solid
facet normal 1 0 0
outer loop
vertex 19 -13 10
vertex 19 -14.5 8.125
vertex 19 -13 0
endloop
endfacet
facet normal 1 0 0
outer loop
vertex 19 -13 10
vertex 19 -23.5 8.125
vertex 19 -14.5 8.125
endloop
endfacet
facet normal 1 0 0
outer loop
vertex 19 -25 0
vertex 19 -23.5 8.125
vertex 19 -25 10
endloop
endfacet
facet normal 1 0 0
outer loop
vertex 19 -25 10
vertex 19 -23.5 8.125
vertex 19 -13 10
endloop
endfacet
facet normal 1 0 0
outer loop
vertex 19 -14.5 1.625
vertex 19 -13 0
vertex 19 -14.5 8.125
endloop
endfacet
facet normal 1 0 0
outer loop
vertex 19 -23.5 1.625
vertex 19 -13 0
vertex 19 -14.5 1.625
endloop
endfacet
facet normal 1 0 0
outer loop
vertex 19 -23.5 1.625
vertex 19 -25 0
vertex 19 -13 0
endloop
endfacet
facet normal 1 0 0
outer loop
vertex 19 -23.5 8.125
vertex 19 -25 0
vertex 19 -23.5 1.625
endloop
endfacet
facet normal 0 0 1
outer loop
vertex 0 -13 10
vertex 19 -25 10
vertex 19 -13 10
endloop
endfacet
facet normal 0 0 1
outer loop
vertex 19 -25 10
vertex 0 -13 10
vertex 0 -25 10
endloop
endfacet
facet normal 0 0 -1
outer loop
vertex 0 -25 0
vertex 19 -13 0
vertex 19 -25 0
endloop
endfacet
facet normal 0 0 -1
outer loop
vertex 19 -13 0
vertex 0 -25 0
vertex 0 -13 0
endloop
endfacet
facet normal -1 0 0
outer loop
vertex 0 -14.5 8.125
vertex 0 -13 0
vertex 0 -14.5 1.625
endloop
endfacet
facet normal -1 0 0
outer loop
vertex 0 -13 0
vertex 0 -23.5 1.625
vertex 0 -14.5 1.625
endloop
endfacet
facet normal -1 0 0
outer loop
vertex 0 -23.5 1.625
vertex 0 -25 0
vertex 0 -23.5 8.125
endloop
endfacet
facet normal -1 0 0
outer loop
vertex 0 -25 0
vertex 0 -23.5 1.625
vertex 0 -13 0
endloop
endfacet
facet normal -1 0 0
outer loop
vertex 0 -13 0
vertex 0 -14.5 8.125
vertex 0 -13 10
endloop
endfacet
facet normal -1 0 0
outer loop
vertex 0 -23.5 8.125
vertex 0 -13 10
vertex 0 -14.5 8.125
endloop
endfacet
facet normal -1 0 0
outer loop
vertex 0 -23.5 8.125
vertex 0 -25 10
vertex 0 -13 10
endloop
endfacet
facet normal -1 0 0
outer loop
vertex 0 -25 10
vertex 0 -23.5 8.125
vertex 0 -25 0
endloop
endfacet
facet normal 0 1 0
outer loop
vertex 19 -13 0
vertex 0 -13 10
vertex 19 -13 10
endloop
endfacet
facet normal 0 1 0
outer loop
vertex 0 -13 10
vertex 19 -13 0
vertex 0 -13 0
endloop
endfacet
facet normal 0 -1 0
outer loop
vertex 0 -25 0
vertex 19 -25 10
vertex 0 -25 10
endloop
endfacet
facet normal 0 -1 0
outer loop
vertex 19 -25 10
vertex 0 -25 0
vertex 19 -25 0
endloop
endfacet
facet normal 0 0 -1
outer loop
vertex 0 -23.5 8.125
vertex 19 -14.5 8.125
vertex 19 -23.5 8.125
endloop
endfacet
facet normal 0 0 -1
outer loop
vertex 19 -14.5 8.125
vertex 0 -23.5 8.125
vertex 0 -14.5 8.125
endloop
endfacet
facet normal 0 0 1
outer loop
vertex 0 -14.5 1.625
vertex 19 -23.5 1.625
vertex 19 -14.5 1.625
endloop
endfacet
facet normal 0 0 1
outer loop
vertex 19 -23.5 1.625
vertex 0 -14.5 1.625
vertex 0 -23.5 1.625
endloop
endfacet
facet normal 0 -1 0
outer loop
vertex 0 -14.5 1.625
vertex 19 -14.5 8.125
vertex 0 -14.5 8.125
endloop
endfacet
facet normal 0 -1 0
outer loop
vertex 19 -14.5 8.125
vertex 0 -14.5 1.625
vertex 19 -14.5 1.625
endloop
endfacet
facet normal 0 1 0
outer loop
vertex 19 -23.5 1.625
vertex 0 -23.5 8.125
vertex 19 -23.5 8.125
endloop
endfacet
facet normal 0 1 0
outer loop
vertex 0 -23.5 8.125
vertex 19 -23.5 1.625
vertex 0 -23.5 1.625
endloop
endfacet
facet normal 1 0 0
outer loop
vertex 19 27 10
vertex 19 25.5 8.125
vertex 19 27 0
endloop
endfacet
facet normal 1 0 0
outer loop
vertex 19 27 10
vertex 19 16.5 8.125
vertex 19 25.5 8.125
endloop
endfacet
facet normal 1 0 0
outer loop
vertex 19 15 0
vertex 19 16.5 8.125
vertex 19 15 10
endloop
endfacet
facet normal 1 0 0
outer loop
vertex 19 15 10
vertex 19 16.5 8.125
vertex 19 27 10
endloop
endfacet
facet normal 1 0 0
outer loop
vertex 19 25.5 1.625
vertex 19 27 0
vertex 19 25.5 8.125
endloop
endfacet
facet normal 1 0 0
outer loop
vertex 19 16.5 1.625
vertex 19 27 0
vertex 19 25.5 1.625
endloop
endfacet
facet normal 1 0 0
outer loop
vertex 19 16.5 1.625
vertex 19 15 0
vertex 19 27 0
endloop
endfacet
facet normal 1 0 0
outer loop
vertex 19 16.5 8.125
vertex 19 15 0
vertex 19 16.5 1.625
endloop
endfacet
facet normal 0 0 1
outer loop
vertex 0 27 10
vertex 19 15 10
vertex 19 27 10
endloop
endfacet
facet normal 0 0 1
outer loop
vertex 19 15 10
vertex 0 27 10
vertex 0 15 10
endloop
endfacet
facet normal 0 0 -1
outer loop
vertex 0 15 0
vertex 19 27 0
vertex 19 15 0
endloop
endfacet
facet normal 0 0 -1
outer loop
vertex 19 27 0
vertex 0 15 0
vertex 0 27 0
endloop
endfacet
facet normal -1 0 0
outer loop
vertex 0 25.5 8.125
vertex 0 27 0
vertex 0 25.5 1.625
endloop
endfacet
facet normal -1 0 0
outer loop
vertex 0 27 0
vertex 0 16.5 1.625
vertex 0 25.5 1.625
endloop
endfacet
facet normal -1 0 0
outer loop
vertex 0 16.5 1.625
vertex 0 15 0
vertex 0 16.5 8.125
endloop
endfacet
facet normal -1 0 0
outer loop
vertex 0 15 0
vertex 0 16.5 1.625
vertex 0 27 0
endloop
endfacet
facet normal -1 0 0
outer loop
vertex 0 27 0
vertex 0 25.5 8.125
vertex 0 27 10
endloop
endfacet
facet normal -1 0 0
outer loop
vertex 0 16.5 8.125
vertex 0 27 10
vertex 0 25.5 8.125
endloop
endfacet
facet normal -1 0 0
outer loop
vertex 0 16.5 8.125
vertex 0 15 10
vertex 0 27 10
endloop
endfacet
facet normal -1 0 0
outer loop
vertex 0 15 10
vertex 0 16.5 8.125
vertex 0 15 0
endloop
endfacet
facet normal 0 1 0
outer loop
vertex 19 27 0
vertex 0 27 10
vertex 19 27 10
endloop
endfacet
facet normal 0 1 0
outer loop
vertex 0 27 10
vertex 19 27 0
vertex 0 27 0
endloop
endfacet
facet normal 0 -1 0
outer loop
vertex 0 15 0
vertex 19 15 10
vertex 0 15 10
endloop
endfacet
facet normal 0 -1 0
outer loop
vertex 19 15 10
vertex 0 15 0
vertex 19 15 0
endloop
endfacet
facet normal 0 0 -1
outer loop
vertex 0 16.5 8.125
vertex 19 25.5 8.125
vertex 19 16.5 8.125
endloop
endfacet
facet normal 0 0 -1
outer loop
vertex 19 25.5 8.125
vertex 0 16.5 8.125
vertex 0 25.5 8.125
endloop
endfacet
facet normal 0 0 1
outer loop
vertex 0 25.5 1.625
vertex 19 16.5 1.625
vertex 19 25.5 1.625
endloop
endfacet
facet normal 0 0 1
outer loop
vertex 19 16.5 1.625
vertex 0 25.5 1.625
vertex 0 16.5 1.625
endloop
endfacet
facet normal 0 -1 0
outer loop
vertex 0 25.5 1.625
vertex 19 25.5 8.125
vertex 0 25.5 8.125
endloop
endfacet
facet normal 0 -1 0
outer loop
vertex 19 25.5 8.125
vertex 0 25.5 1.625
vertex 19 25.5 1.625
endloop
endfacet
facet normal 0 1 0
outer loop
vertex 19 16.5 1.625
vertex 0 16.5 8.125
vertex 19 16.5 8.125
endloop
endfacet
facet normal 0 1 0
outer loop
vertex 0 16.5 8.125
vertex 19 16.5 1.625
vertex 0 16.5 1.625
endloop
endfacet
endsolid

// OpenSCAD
// file: chain-loop.scad
module chainLoop(xLength = 19,
                 yLength = 12,
                 zLength = 10)
{
    difference()
    {
        color("green")
        cube([xLength, yLength, zLength]);
                
        cutout(xLength, yLength, zLength);
    }
}


module cutout(xLength, yLength, zLength)
{
    zLength = zLength * 0.65;

    zTranslate = zLength / 4.0;
    
    yAxisLength = yLength*0.75;
    
    yTranslate = (yLength / 2.0) - (yAxisLength / 2.0);
    
    // this is the cutout on the Y axis
    translate([-1, yTranslate, zTranslate])
    cube([xLength+3, yAxisLength, zLength]);    
}
// main file
use <chain-loop.scad>
        
translate([0, -25, 0])
chainLoop();

translate([0, 15, 0])
chainLoop();
